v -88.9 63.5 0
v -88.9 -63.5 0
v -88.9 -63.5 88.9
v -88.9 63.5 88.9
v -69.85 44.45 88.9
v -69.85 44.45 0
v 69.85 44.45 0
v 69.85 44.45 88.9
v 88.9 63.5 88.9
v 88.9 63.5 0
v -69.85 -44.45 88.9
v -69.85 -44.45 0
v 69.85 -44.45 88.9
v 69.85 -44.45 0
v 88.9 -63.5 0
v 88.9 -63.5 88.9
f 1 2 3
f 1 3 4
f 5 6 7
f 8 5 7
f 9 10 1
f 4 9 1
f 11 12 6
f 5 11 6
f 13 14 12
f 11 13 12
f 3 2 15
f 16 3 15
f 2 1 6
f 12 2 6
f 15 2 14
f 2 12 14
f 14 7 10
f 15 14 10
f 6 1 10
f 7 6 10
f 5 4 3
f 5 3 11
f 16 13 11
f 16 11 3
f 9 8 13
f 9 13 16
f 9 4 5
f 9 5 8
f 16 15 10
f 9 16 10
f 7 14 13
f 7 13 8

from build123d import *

# Parameters (mm, degrees)
F1_DEPTH = 88.9
F0_W     = 19.05
F0_H     = 88.9
F2_DEPTH = 88.9


with BuildPart() as f1:
    # F0 (on Top) → F1 (new body)
    with BuildSketch(Plane.XY):
        Polygon((88.9, 63.5), (-88.9, 63.5), (-88.9, 44.45), (-69.85, 44.45), (69.85, 44.45), (88.9, 44.45), align=None)
        Polygon((-69.85, -44.45), (-88.9, -44.45), (-88.9, -63.5), (88.9, -63.5), (88.9, -44.45), (69.85, -44.45), align=None)
    extrude(amount=F1_DEPTH)

    # F0 (on Top) → F2 (join)
    with BuildSketch(Plane.XY):
        with Locations((-79.375, 0)):
            Rectangle(F0_W, F0_H)
        with Locations((79.375, 0)):
            Rectangle(F0_W, F0_H)
    extrude(amount=F2_DEPTH)


solid = f1.part
